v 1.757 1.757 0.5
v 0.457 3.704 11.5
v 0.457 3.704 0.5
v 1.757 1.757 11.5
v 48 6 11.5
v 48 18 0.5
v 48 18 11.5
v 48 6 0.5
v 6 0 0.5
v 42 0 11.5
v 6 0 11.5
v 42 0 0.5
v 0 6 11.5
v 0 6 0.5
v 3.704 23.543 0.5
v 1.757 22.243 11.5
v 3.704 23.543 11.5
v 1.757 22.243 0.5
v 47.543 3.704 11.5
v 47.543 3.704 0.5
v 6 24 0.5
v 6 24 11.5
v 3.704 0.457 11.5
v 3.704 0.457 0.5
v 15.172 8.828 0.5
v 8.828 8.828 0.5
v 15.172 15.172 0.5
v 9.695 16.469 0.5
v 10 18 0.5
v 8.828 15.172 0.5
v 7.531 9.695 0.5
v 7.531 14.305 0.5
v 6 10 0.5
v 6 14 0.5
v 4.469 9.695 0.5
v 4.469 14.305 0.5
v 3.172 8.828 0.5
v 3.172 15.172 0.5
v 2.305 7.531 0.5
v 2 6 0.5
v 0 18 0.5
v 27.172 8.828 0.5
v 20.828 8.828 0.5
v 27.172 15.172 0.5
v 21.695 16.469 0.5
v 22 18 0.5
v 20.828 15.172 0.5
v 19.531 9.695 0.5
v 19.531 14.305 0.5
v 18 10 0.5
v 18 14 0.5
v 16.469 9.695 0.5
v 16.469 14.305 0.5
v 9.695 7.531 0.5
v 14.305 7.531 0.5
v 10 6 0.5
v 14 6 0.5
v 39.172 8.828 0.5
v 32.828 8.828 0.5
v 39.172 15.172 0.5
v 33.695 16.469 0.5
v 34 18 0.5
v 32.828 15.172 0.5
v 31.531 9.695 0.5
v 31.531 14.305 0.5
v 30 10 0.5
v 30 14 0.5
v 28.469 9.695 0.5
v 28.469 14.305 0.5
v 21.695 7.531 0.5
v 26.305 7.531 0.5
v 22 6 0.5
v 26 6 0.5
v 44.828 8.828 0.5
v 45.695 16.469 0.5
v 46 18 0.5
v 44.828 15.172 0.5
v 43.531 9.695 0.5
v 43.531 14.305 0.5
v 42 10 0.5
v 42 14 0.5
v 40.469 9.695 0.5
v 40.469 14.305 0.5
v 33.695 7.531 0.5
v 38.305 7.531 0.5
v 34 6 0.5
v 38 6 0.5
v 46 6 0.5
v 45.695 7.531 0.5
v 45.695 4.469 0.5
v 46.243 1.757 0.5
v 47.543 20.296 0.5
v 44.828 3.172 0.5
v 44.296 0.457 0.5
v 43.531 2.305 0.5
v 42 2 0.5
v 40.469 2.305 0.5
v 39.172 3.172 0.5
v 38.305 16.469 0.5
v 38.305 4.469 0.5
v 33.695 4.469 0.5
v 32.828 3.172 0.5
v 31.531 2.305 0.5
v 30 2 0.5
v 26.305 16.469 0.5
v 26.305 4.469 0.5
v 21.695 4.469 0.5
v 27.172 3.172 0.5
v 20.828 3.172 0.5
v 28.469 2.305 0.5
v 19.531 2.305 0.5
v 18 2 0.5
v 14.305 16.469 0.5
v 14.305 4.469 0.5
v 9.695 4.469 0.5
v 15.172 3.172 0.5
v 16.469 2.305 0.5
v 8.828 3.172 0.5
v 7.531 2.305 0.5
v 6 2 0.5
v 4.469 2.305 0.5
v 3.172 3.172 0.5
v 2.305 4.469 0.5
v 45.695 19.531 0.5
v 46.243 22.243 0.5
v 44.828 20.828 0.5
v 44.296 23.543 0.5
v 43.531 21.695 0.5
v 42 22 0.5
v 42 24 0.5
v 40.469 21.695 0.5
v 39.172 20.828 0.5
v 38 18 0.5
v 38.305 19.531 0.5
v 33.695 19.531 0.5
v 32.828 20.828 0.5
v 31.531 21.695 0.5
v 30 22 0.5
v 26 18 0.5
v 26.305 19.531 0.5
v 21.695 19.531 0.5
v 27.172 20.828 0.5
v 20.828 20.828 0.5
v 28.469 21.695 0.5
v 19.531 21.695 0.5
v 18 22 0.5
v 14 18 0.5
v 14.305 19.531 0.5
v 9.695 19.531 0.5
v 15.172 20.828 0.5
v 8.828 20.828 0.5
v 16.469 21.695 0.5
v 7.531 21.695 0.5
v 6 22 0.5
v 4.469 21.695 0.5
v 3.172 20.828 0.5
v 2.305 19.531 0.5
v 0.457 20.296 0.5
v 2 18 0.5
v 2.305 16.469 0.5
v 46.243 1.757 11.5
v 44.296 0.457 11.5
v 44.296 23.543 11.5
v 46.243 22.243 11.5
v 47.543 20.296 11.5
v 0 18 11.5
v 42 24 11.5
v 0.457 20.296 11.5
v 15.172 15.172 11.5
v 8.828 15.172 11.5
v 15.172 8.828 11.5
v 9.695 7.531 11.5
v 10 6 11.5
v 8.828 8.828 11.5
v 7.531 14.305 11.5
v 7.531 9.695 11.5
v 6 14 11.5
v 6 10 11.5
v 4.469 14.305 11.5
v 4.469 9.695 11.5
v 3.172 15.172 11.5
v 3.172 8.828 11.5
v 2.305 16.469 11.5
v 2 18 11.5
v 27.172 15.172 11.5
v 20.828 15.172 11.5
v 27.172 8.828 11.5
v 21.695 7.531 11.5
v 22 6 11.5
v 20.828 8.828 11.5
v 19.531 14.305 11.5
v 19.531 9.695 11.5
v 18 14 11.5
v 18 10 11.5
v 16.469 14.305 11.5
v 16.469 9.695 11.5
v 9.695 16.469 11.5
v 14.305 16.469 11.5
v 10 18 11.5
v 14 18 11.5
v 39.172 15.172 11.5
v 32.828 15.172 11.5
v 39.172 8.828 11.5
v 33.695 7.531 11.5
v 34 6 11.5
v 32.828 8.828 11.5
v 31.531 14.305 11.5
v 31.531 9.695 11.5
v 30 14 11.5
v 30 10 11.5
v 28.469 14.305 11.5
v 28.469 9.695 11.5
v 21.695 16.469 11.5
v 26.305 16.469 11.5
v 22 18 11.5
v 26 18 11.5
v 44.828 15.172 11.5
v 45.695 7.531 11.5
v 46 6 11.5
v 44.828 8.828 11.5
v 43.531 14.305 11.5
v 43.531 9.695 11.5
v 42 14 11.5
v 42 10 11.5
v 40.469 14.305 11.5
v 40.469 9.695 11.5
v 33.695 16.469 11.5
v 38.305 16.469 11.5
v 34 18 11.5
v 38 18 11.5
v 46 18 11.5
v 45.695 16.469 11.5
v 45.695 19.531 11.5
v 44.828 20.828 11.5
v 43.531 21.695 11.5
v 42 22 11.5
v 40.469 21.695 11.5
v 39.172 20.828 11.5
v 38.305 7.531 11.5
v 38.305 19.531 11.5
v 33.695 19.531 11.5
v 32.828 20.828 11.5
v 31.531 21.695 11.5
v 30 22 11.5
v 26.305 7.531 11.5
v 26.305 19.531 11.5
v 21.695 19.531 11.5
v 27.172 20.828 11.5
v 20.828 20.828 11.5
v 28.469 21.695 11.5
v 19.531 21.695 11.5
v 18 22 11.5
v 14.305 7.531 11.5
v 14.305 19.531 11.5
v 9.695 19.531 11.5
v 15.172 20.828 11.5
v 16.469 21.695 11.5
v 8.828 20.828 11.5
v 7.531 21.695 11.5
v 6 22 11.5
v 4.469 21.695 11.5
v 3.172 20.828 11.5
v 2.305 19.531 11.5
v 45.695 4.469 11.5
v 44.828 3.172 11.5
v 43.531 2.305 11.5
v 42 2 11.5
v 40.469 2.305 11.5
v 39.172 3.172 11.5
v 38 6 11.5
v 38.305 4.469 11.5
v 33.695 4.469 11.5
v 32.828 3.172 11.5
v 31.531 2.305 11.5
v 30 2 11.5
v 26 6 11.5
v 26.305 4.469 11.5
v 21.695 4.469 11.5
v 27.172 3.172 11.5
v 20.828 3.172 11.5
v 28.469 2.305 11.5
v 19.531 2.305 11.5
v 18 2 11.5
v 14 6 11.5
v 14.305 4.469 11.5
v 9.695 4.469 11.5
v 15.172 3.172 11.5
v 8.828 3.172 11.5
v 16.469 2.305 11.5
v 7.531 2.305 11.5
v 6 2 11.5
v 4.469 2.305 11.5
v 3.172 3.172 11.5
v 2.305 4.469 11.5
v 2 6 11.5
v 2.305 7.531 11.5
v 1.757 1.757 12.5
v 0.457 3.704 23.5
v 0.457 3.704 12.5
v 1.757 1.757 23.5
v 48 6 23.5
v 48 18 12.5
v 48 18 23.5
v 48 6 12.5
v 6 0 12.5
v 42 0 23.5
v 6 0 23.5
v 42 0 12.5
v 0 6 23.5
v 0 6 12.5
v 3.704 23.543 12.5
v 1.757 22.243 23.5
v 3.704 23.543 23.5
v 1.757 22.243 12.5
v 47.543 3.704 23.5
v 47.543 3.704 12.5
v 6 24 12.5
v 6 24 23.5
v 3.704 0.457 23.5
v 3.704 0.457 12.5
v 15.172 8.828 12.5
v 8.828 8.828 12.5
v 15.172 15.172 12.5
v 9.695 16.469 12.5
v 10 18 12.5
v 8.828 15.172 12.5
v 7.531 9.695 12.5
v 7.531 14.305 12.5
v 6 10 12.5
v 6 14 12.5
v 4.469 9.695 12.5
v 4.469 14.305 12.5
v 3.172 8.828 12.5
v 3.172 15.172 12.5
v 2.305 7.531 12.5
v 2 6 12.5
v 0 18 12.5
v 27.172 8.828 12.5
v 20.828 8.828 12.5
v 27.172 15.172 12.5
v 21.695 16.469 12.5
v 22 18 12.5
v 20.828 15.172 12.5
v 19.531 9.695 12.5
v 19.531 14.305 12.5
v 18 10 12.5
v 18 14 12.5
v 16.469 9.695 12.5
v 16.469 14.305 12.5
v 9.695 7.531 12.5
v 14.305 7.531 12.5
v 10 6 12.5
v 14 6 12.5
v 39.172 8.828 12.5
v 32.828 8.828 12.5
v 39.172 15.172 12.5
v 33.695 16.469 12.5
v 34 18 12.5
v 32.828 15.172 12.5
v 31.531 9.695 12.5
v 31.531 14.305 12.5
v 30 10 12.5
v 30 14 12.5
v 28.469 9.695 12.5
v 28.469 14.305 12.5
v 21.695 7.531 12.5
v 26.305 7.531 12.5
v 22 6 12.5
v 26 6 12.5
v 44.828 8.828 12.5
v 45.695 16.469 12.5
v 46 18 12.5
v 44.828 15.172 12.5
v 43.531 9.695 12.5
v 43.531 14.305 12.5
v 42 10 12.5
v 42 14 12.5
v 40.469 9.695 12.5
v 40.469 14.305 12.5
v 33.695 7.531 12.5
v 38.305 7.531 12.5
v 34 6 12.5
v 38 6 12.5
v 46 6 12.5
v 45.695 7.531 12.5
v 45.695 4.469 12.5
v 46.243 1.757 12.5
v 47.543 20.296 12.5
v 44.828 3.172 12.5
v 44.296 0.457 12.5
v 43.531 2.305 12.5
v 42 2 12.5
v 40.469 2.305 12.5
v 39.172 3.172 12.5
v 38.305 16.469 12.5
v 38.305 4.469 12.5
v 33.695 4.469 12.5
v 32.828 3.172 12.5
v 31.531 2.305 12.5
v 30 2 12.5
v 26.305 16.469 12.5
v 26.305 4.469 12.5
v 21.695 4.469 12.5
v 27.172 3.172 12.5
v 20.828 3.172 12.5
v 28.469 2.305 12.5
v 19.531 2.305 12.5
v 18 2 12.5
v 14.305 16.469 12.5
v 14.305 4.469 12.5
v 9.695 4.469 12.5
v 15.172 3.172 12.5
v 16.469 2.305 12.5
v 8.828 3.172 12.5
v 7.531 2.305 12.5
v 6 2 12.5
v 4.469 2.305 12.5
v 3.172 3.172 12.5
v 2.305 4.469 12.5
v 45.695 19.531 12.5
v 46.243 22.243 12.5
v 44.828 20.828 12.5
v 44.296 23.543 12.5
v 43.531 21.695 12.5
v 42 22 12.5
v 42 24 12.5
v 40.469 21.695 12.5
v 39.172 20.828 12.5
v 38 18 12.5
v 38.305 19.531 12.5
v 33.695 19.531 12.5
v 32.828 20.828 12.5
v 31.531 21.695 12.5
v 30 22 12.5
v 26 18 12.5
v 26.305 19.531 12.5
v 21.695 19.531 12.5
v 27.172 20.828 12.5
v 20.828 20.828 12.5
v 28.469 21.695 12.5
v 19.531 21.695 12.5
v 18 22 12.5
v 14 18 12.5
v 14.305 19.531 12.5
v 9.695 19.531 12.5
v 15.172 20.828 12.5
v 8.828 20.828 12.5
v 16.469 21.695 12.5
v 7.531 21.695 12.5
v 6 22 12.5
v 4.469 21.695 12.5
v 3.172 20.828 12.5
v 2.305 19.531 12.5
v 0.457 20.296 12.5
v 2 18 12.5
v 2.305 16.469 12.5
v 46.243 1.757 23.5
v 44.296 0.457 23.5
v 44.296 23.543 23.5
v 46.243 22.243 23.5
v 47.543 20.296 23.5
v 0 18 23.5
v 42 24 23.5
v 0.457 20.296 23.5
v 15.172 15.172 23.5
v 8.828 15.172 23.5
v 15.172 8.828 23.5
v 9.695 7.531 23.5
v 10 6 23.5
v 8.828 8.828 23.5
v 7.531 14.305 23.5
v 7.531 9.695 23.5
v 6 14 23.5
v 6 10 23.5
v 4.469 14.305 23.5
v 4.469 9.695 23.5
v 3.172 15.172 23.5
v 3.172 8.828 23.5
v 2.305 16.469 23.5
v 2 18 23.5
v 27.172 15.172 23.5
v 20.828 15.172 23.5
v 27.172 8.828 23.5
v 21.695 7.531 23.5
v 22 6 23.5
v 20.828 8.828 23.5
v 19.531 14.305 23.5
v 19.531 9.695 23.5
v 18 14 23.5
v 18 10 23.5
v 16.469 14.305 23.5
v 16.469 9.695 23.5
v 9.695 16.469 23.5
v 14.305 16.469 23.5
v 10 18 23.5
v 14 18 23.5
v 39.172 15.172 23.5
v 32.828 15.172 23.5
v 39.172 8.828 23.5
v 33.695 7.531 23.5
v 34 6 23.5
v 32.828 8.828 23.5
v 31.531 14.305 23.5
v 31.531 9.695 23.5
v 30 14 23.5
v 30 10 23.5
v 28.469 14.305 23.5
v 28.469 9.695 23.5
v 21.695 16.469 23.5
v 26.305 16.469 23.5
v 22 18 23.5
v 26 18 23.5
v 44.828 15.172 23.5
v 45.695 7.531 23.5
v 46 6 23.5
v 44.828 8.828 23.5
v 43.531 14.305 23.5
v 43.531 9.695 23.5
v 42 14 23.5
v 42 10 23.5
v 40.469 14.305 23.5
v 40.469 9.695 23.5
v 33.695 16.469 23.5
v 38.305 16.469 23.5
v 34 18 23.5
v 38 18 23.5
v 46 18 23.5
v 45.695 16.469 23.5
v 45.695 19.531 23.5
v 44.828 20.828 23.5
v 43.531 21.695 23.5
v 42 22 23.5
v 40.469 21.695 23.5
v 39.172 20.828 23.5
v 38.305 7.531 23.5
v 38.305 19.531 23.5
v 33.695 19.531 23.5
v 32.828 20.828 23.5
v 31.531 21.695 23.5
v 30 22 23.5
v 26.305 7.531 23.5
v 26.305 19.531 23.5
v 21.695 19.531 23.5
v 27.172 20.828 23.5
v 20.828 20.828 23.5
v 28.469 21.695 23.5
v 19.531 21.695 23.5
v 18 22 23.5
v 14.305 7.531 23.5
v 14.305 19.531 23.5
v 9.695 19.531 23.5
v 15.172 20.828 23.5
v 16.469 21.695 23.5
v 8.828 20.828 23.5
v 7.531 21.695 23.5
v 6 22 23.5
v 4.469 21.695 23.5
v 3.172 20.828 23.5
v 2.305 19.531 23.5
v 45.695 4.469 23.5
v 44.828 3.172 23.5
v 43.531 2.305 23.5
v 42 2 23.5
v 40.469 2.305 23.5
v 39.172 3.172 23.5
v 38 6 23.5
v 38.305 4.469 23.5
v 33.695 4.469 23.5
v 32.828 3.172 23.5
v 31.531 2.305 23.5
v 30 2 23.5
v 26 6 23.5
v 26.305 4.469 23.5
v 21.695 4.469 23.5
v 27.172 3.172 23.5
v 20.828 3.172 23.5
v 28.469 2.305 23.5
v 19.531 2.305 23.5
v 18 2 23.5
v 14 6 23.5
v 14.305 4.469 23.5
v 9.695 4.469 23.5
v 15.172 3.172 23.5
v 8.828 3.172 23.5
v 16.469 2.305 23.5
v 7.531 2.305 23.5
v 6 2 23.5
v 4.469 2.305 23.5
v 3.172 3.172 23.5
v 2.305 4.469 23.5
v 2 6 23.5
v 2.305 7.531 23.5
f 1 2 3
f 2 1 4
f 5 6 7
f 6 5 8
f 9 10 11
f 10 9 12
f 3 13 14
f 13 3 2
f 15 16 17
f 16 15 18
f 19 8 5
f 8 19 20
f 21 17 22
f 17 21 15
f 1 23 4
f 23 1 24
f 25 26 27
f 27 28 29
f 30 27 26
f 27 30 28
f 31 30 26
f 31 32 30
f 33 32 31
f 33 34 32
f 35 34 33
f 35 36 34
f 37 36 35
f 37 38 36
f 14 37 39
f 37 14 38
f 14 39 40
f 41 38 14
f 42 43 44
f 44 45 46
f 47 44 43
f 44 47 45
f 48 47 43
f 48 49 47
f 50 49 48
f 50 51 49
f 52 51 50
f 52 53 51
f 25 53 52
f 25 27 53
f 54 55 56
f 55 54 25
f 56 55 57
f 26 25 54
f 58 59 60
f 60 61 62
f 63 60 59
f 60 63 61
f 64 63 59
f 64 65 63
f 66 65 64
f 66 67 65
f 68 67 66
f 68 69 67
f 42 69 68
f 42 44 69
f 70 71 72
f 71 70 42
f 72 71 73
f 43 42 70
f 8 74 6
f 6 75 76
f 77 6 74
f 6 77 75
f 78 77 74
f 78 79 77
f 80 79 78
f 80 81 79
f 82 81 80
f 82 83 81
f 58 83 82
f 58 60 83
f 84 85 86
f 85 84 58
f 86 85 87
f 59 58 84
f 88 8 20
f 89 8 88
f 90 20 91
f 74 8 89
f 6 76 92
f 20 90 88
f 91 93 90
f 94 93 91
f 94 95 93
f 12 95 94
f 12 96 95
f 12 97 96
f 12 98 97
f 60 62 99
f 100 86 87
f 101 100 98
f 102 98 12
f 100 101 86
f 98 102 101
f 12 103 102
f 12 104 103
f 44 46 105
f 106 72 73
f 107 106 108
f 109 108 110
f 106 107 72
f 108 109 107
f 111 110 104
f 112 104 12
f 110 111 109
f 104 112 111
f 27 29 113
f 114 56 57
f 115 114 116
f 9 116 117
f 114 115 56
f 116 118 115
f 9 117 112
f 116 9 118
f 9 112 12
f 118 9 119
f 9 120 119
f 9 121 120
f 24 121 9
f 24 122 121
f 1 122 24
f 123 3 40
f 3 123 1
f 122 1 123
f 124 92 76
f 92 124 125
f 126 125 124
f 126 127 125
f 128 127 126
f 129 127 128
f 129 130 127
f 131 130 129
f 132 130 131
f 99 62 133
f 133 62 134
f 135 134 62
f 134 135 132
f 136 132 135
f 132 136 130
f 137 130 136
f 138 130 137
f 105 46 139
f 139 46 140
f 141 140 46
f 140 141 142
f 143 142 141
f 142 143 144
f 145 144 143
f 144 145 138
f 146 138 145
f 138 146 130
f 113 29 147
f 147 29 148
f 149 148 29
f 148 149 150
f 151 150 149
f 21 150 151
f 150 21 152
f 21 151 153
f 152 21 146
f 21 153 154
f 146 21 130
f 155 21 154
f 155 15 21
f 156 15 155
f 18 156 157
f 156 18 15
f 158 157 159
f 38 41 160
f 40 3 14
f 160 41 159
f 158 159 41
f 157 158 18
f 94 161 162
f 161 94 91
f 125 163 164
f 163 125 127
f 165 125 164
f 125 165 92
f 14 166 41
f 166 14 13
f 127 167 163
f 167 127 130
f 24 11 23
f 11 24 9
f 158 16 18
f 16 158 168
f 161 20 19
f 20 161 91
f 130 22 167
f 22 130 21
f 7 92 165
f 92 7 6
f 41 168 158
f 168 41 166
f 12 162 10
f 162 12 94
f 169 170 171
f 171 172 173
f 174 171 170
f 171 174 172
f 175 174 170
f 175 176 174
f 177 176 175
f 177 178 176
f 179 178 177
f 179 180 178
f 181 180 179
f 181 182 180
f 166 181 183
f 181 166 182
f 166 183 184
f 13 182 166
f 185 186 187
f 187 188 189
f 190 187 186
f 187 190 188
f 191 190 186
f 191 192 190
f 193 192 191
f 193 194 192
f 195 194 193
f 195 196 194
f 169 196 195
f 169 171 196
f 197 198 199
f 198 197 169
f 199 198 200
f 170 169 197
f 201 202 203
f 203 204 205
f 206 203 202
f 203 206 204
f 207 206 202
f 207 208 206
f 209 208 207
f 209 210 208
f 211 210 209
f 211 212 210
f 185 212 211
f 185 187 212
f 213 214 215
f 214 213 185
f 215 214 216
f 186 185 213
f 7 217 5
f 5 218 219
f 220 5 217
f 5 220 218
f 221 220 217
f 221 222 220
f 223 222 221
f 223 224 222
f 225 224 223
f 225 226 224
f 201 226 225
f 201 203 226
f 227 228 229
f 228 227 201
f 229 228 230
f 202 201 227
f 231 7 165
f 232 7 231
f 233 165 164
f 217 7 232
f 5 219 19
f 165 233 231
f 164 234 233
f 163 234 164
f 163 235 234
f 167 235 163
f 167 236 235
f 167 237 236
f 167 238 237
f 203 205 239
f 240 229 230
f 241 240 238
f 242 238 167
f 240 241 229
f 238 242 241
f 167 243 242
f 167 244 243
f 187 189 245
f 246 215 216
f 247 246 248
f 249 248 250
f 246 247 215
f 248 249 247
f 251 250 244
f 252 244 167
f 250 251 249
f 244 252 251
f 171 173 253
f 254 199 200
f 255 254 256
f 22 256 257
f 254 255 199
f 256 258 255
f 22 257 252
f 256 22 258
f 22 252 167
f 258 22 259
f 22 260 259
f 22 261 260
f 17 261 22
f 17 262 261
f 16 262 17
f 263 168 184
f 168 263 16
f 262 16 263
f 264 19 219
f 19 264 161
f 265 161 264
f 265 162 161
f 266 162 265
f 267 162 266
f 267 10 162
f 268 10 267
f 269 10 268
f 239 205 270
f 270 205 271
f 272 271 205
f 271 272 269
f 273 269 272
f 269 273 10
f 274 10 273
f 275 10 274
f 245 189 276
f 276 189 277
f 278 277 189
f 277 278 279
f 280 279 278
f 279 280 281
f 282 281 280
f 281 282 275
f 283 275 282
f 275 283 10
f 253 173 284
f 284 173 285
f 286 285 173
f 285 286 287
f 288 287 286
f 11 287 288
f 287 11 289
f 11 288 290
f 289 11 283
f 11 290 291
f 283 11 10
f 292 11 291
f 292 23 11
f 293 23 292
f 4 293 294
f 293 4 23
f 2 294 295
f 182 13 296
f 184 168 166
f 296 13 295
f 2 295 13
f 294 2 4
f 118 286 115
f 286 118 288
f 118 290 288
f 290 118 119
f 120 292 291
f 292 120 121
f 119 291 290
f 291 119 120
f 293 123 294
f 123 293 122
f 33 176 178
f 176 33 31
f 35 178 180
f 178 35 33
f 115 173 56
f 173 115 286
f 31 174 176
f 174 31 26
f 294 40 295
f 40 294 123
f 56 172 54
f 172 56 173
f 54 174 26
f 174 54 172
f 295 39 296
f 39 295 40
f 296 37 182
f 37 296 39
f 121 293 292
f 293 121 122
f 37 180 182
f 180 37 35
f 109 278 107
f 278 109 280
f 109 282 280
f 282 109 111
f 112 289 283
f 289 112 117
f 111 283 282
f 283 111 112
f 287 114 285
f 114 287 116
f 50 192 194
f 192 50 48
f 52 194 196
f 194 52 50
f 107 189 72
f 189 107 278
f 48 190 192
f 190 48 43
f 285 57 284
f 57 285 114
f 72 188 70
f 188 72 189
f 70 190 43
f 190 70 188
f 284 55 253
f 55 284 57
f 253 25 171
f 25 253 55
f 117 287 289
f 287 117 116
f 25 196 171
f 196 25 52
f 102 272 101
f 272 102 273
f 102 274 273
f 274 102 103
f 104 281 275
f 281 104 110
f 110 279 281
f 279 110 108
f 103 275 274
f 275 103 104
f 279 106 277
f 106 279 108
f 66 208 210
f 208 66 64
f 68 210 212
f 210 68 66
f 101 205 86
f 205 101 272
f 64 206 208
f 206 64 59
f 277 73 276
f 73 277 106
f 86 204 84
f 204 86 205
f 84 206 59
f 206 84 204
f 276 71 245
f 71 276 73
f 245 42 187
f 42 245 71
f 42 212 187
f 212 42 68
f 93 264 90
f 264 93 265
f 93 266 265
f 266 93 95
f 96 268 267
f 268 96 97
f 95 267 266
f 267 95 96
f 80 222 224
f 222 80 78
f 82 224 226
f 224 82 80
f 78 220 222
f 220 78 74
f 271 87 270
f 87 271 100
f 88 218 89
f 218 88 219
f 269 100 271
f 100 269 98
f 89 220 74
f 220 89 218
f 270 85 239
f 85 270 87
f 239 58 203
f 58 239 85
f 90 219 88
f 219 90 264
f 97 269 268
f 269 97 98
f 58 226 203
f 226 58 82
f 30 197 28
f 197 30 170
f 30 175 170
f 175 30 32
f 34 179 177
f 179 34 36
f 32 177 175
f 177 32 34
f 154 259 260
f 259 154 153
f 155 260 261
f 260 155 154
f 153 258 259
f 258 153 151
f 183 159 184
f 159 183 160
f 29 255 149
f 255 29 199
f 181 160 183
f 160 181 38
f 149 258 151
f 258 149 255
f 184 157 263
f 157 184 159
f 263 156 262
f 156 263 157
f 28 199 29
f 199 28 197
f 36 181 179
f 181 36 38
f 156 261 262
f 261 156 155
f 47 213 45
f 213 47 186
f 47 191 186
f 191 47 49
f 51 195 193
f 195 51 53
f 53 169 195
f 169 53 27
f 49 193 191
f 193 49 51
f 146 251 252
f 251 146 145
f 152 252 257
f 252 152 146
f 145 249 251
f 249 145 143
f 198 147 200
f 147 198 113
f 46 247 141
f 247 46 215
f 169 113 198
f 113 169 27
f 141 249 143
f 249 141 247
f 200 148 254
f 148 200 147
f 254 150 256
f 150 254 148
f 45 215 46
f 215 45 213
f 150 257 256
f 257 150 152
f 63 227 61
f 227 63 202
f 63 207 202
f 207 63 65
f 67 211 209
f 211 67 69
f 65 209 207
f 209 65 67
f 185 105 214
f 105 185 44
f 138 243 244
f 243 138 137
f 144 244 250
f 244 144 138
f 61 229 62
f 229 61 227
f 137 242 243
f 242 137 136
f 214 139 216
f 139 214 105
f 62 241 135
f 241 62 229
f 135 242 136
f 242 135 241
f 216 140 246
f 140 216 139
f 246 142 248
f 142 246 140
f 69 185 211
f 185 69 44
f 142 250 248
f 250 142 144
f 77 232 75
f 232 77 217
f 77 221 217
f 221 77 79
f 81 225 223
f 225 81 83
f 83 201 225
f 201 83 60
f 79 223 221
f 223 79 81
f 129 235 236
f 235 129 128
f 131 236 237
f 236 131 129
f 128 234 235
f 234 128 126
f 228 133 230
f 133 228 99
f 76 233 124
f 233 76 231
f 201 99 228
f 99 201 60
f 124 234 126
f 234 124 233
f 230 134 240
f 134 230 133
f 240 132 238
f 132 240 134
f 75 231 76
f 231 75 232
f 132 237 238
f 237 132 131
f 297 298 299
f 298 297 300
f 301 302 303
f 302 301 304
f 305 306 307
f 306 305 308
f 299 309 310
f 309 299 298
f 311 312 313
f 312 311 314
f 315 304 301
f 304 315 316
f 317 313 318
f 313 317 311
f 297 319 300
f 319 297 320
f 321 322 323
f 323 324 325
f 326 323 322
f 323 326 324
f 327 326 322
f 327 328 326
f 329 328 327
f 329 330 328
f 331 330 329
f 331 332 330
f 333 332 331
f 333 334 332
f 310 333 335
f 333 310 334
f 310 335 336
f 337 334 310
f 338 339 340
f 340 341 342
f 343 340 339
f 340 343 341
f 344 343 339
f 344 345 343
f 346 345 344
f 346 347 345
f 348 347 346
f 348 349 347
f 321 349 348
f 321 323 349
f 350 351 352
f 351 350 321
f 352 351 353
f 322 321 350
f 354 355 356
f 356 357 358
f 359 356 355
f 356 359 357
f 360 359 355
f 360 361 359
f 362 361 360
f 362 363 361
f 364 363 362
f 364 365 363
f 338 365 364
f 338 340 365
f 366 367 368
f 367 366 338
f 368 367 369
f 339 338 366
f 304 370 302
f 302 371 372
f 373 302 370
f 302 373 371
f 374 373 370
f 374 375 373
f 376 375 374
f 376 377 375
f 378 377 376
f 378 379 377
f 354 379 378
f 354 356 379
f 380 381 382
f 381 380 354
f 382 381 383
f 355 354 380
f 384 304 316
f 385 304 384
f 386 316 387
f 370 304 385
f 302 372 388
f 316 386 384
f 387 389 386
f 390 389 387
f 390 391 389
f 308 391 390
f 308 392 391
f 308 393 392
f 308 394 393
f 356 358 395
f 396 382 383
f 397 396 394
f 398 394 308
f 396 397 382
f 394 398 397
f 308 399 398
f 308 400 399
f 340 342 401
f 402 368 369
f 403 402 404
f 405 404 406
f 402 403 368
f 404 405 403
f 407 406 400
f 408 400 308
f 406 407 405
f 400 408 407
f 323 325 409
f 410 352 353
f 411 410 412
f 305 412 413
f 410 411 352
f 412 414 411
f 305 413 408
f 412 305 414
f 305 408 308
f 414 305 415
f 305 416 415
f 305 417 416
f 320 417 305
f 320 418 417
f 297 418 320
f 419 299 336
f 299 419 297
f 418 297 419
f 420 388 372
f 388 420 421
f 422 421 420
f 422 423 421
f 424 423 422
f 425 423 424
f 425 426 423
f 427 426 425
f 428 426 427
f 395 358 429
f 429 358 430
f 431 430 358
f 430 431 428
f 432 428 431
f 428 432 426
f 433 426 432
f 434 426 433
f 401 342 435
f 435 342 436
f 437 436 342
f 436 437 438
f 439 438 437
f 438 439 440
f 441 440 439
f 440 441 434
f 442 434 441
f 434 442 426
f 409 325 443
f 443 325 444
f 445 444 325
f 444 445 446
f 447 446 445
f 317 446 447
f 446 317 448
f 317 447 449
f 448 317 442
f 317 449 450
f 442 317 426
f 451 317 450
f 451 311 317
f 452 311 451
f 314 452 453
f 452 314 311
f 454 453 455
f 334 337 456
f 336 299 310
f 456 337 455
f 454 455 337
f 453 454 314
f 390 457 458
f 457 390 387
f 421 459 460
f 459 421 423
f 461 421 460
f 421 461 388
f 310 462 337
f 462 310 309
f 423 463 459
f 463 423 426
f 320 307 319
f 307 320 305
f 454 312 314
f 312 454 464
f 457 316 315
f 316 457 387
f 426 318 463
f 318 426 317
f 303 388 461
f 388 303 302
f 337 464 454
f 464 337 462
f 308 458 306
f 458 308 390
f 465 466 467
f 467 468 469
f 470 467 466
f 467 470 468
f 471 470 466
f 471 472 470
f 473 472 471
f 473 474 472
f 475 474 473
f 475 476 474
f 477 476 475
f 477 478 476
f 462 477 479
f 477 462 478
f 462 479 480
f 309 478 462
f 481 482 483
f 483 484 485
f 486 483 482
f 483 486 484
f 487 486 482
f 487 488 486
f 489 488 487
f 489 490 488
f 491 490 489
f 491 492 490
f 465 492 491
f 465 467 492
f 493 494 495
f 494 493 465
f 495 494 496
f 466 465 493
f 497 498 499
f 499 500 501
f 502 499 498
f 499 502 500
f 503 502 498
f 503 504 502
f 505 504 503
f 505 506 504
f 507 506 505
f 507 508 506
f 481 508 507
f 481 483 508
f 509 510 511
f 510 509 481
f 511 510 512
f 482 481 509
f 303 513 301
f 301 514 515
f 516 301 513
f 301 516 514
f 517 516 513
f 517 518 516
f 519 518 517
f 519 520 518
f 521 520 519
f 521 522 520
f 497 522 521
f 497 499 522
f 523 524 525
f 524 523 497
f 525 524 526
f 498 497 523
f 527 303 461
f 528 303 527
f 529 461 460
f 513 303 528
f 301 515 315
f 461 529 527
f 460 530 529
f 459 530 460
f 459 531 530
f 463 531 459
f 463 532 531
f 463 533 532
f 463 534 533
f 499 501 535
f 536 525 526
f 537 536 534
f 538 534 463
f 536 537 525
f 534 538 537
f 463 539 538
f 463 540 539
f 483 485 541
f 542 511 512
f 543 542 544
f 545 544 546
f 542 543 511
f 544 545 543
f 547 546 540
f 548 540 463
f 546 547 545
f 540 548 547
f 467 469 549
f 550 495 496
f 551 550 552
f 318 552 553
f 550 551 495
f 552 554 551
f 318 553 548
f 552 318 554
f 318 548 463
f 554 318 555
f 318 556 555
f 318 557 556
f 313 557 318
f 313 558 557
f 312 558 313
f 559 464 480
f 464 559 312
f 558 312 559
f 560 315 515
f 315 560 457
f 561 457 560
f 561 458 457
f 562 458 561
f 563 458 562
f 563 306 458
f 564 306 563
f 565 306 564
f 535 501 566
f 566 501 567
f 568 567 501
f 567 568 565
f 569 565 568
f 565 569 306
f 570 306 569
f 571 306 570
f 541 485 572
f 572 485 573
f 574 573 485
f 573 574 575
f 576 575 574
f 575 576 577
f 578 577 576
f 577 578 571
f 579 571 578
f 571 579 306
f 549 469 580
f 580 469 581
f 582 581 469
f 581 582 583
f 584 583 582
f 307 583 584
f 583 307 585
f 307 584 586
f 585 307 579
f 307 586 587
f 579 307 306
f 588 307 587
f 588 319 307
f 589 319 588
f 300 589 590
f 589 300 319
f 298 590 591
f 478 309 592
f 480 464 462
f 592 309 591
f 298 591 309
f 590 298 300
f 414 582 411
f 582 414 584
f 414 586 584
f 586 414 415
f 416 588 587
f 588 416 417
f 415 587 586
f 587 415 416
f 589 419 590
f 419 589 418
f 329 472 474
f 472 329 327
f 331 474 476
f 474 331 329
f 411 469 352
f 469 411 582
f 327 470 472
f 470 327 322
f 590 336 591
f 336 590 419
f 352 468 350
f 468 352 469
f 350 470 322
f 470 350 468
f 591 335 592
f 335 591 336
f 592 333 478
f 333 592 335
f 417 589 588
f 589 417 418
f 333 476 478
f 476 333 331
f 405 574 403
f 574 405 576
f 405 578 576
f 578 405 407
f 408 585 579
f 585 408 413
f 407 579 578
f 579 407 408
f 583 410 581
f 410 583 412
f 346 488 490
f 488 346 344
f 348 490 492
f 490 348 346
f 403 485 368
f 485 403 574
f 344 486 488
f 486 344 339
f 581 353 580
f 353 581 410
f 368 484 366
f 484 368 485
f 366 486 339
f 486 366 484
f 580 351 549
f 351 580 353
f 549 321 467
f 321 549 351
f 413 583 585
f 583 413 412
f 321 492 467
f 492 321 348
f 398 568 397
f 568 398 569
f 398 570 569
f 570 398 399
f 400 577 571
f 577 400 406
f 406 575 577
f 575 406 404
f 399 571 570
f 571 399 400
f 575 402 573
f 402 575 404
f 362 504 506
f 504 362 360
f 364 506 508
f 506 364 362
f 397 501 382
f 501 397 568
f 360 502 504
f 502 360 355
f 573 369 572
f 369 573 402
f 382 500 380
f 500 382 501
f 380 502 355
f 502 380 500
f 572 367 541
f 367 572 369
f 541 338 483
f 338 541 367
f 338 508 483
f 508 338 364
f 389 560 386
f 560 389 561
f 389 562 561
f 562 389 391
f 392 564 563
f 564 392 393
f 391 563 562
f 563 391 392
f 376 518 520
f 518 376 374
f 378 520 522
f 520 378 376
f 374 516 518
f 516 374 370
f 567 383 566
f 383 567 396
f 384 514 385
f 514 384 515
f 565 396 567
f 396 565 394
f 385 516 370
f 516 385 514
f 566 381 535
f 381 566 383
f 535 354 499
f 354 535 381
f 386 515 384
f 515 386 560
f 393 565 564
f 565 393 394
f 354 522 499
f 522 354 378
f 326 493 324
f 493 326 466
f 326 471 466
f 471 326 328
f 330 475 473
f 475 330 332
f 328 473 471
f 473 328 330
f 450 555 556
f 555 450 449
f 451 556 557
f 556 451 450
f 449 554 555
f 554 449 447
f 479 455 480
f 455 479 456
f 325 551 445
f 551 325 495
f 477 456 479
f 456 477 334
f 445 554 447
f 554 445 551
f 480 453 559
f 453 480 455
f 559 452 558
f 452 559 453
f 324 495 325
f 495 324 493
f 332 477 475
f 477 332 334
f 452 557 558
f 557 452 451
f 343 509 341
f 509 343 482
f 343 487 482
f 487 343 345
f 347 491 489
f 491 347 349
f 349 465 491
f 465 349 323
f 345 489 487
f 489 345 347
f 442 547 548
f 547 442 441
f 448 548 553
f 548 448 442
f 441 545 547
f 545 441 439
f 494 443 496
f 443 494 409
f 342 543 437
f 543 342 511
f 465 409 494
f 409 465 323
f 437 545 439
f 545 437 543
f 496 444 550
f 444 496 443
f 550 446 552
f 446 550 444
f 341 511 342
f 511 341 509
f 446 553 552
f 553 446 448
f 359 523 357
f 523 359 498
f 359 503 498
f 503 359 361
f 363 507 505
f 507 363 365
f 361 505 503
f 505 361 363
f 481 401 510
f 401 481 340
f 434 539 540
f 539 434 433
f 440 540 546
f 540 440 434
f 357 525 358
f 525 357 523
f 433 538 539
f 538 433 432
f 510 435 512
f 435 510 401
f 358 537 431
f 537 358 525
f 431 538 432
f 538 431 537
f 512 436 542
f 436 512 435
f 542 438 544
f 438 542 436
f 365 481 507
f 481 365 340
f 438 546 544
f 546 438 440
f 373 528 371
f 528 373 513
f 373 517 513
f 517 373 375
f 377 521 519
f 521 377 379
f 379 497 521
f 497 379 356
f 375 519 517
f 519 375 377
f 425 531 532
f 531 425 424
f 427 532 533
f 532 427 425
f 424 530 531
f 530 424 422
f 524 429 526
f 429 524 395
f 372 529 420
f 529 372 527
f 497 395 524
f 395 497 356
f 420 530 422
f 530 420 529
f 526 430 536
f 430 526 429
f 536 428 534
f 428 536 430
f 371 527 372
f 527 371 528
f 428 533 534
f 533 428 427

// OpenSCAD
union()
{
    translate([0.0, 0.0, 0.0])
    {
        color(c = [1.0, 0.0, 0.0, 1.0])
        {
            difference()
            {
                translate([0.0, 0.0, 0.5])
                {
                    linear_extrude(height = 11.0, twist = 0.0, scale = 1.0, slices = 1, center = false)
                    {
                        hull()
                        {
                            translate([6.0, 6.0])
                            {
                                M218();
                            }
                            translate([42.0, 6.0])
                            {
                                M218();
                            }
                            translate([6.0, 18.0])
                            {
                                M218();
                            }
                            translate([42.0, 18.0])
                            {
                                M218();
                            }
                        }
                    }
                }
                translate([6.0, 6.0, 0.0])
                {
                    M217();
                }
                translate([18.0, 6.0, 0.0])
                {
                    M217();
                }
                translate([30.0, 6.0, 0.0])
                {
                    M217();
                }
                translate([42.0, 6.0, 0.0])
                {
                    M217();
                }
                translate([6.0, 18.0, 0.0])
                {
                    M217();
                }
                translate([18.0, 18.0, 0.0])
                {
                    M217();
                }
                translate([30.0, 18.0, 0.0])
                {
                    M217();
                }
                translate([42.0, 18.0, 0.0])
                {
                    M217();
                }
            }
        }
    }
    translate([0.0, 0.0, 12.0])
    {
        color(c = [0.0, 1.0, 0.0, 1.0])
        {
            difference()
            {
                translate([0.0, 0.0, 0.5])
                {
                    linear_extrude(height = 11.0, twist = 0.0, scale = 1.0, slices = 1, center = false)
                    {
                        hull()
                        {
                            translate([6.0, 6.0])
                            {
                                M218();
                            }
                            translate([42.0, 6.0])
                            {
                                M218();
                            }
                            translate([6.0, 18.0])
                            {
                                M218();
                            }
                            translate([42.0, 18.0])
                            {
                                M218();
                            }
                        }
                    }
                }
                translate([6.0, 6.0, 0.0])
                {
                    M217();
                }
                translate([18.0, 6.0, 0.0])
                {
                    M217();
                }
                translate([30.0, 6.0, 0.0])
                {
                    M217();
                }
                translate([42.0, 6.0, 0.0])
                {
                    M217();
                }
                translate([6.0, 18.0, 0.0])
                {
                    M217();
                }
                translate([18.0, 18.0, 0.0])
                {
                    M217();
                }
                translate([30.0, 18.0, 0.0])
                {
                    M217();
                }
                translate([42.0, 18.0, 0.0])
                {
                    M217();
                }
            }
        }
    }
}

module M217()
{
    linear_extrude(height = 24.0, twist = 0.0, scale = 1.0, slices = 1, center = false)
    {
        M212();
    }
}

module M218()
{
    scale([12.0, 12.0])
    {
        M209();
    }
}

module M209()
{
    polygon
    (
        points =
        [
            [0.5, 0.0], 
            [0.46193976625564337, 0.1913417161825449], 
            [0.3535533905932738, 0.35355339059327373], 
            [0.19134171618254492, 0.46193976625564337], 
            [3.061616997868383E-17, 0.5], 
            [-0.19134171618254486, 0.46193976625564337], 
            [-0.35355339059327373, 0.3535533905932738], 
            [-0.46193976625564337, 0.19134171618254495], 
            [-0.5, 6.123233995736766E-17], 
            [-0.4619397662556434, -0.19134171618254484], 
            [-0.35355339059327384, -0.35355339059327373], 
            [-0.19134171618254517, -0.46193976625564326], 
            [-9.184850993605148E-17, -0.5], 
            [0.191341716182545, -0.4619397662556433], 
            [0.3535533905932737, -0.35355339059327384], 
            [0.46193976625564326, -0.1913417161825452]
        ],
        paths =
        [
            [0, 1, 2, 3, 4, 5, 6, 7, 8, 9, 10, 11, 12, 13, 14, 15]
        ]
    );
}

module M212()
{
    scale([8.0, 8.0])
    {
        M209();
    }
}
